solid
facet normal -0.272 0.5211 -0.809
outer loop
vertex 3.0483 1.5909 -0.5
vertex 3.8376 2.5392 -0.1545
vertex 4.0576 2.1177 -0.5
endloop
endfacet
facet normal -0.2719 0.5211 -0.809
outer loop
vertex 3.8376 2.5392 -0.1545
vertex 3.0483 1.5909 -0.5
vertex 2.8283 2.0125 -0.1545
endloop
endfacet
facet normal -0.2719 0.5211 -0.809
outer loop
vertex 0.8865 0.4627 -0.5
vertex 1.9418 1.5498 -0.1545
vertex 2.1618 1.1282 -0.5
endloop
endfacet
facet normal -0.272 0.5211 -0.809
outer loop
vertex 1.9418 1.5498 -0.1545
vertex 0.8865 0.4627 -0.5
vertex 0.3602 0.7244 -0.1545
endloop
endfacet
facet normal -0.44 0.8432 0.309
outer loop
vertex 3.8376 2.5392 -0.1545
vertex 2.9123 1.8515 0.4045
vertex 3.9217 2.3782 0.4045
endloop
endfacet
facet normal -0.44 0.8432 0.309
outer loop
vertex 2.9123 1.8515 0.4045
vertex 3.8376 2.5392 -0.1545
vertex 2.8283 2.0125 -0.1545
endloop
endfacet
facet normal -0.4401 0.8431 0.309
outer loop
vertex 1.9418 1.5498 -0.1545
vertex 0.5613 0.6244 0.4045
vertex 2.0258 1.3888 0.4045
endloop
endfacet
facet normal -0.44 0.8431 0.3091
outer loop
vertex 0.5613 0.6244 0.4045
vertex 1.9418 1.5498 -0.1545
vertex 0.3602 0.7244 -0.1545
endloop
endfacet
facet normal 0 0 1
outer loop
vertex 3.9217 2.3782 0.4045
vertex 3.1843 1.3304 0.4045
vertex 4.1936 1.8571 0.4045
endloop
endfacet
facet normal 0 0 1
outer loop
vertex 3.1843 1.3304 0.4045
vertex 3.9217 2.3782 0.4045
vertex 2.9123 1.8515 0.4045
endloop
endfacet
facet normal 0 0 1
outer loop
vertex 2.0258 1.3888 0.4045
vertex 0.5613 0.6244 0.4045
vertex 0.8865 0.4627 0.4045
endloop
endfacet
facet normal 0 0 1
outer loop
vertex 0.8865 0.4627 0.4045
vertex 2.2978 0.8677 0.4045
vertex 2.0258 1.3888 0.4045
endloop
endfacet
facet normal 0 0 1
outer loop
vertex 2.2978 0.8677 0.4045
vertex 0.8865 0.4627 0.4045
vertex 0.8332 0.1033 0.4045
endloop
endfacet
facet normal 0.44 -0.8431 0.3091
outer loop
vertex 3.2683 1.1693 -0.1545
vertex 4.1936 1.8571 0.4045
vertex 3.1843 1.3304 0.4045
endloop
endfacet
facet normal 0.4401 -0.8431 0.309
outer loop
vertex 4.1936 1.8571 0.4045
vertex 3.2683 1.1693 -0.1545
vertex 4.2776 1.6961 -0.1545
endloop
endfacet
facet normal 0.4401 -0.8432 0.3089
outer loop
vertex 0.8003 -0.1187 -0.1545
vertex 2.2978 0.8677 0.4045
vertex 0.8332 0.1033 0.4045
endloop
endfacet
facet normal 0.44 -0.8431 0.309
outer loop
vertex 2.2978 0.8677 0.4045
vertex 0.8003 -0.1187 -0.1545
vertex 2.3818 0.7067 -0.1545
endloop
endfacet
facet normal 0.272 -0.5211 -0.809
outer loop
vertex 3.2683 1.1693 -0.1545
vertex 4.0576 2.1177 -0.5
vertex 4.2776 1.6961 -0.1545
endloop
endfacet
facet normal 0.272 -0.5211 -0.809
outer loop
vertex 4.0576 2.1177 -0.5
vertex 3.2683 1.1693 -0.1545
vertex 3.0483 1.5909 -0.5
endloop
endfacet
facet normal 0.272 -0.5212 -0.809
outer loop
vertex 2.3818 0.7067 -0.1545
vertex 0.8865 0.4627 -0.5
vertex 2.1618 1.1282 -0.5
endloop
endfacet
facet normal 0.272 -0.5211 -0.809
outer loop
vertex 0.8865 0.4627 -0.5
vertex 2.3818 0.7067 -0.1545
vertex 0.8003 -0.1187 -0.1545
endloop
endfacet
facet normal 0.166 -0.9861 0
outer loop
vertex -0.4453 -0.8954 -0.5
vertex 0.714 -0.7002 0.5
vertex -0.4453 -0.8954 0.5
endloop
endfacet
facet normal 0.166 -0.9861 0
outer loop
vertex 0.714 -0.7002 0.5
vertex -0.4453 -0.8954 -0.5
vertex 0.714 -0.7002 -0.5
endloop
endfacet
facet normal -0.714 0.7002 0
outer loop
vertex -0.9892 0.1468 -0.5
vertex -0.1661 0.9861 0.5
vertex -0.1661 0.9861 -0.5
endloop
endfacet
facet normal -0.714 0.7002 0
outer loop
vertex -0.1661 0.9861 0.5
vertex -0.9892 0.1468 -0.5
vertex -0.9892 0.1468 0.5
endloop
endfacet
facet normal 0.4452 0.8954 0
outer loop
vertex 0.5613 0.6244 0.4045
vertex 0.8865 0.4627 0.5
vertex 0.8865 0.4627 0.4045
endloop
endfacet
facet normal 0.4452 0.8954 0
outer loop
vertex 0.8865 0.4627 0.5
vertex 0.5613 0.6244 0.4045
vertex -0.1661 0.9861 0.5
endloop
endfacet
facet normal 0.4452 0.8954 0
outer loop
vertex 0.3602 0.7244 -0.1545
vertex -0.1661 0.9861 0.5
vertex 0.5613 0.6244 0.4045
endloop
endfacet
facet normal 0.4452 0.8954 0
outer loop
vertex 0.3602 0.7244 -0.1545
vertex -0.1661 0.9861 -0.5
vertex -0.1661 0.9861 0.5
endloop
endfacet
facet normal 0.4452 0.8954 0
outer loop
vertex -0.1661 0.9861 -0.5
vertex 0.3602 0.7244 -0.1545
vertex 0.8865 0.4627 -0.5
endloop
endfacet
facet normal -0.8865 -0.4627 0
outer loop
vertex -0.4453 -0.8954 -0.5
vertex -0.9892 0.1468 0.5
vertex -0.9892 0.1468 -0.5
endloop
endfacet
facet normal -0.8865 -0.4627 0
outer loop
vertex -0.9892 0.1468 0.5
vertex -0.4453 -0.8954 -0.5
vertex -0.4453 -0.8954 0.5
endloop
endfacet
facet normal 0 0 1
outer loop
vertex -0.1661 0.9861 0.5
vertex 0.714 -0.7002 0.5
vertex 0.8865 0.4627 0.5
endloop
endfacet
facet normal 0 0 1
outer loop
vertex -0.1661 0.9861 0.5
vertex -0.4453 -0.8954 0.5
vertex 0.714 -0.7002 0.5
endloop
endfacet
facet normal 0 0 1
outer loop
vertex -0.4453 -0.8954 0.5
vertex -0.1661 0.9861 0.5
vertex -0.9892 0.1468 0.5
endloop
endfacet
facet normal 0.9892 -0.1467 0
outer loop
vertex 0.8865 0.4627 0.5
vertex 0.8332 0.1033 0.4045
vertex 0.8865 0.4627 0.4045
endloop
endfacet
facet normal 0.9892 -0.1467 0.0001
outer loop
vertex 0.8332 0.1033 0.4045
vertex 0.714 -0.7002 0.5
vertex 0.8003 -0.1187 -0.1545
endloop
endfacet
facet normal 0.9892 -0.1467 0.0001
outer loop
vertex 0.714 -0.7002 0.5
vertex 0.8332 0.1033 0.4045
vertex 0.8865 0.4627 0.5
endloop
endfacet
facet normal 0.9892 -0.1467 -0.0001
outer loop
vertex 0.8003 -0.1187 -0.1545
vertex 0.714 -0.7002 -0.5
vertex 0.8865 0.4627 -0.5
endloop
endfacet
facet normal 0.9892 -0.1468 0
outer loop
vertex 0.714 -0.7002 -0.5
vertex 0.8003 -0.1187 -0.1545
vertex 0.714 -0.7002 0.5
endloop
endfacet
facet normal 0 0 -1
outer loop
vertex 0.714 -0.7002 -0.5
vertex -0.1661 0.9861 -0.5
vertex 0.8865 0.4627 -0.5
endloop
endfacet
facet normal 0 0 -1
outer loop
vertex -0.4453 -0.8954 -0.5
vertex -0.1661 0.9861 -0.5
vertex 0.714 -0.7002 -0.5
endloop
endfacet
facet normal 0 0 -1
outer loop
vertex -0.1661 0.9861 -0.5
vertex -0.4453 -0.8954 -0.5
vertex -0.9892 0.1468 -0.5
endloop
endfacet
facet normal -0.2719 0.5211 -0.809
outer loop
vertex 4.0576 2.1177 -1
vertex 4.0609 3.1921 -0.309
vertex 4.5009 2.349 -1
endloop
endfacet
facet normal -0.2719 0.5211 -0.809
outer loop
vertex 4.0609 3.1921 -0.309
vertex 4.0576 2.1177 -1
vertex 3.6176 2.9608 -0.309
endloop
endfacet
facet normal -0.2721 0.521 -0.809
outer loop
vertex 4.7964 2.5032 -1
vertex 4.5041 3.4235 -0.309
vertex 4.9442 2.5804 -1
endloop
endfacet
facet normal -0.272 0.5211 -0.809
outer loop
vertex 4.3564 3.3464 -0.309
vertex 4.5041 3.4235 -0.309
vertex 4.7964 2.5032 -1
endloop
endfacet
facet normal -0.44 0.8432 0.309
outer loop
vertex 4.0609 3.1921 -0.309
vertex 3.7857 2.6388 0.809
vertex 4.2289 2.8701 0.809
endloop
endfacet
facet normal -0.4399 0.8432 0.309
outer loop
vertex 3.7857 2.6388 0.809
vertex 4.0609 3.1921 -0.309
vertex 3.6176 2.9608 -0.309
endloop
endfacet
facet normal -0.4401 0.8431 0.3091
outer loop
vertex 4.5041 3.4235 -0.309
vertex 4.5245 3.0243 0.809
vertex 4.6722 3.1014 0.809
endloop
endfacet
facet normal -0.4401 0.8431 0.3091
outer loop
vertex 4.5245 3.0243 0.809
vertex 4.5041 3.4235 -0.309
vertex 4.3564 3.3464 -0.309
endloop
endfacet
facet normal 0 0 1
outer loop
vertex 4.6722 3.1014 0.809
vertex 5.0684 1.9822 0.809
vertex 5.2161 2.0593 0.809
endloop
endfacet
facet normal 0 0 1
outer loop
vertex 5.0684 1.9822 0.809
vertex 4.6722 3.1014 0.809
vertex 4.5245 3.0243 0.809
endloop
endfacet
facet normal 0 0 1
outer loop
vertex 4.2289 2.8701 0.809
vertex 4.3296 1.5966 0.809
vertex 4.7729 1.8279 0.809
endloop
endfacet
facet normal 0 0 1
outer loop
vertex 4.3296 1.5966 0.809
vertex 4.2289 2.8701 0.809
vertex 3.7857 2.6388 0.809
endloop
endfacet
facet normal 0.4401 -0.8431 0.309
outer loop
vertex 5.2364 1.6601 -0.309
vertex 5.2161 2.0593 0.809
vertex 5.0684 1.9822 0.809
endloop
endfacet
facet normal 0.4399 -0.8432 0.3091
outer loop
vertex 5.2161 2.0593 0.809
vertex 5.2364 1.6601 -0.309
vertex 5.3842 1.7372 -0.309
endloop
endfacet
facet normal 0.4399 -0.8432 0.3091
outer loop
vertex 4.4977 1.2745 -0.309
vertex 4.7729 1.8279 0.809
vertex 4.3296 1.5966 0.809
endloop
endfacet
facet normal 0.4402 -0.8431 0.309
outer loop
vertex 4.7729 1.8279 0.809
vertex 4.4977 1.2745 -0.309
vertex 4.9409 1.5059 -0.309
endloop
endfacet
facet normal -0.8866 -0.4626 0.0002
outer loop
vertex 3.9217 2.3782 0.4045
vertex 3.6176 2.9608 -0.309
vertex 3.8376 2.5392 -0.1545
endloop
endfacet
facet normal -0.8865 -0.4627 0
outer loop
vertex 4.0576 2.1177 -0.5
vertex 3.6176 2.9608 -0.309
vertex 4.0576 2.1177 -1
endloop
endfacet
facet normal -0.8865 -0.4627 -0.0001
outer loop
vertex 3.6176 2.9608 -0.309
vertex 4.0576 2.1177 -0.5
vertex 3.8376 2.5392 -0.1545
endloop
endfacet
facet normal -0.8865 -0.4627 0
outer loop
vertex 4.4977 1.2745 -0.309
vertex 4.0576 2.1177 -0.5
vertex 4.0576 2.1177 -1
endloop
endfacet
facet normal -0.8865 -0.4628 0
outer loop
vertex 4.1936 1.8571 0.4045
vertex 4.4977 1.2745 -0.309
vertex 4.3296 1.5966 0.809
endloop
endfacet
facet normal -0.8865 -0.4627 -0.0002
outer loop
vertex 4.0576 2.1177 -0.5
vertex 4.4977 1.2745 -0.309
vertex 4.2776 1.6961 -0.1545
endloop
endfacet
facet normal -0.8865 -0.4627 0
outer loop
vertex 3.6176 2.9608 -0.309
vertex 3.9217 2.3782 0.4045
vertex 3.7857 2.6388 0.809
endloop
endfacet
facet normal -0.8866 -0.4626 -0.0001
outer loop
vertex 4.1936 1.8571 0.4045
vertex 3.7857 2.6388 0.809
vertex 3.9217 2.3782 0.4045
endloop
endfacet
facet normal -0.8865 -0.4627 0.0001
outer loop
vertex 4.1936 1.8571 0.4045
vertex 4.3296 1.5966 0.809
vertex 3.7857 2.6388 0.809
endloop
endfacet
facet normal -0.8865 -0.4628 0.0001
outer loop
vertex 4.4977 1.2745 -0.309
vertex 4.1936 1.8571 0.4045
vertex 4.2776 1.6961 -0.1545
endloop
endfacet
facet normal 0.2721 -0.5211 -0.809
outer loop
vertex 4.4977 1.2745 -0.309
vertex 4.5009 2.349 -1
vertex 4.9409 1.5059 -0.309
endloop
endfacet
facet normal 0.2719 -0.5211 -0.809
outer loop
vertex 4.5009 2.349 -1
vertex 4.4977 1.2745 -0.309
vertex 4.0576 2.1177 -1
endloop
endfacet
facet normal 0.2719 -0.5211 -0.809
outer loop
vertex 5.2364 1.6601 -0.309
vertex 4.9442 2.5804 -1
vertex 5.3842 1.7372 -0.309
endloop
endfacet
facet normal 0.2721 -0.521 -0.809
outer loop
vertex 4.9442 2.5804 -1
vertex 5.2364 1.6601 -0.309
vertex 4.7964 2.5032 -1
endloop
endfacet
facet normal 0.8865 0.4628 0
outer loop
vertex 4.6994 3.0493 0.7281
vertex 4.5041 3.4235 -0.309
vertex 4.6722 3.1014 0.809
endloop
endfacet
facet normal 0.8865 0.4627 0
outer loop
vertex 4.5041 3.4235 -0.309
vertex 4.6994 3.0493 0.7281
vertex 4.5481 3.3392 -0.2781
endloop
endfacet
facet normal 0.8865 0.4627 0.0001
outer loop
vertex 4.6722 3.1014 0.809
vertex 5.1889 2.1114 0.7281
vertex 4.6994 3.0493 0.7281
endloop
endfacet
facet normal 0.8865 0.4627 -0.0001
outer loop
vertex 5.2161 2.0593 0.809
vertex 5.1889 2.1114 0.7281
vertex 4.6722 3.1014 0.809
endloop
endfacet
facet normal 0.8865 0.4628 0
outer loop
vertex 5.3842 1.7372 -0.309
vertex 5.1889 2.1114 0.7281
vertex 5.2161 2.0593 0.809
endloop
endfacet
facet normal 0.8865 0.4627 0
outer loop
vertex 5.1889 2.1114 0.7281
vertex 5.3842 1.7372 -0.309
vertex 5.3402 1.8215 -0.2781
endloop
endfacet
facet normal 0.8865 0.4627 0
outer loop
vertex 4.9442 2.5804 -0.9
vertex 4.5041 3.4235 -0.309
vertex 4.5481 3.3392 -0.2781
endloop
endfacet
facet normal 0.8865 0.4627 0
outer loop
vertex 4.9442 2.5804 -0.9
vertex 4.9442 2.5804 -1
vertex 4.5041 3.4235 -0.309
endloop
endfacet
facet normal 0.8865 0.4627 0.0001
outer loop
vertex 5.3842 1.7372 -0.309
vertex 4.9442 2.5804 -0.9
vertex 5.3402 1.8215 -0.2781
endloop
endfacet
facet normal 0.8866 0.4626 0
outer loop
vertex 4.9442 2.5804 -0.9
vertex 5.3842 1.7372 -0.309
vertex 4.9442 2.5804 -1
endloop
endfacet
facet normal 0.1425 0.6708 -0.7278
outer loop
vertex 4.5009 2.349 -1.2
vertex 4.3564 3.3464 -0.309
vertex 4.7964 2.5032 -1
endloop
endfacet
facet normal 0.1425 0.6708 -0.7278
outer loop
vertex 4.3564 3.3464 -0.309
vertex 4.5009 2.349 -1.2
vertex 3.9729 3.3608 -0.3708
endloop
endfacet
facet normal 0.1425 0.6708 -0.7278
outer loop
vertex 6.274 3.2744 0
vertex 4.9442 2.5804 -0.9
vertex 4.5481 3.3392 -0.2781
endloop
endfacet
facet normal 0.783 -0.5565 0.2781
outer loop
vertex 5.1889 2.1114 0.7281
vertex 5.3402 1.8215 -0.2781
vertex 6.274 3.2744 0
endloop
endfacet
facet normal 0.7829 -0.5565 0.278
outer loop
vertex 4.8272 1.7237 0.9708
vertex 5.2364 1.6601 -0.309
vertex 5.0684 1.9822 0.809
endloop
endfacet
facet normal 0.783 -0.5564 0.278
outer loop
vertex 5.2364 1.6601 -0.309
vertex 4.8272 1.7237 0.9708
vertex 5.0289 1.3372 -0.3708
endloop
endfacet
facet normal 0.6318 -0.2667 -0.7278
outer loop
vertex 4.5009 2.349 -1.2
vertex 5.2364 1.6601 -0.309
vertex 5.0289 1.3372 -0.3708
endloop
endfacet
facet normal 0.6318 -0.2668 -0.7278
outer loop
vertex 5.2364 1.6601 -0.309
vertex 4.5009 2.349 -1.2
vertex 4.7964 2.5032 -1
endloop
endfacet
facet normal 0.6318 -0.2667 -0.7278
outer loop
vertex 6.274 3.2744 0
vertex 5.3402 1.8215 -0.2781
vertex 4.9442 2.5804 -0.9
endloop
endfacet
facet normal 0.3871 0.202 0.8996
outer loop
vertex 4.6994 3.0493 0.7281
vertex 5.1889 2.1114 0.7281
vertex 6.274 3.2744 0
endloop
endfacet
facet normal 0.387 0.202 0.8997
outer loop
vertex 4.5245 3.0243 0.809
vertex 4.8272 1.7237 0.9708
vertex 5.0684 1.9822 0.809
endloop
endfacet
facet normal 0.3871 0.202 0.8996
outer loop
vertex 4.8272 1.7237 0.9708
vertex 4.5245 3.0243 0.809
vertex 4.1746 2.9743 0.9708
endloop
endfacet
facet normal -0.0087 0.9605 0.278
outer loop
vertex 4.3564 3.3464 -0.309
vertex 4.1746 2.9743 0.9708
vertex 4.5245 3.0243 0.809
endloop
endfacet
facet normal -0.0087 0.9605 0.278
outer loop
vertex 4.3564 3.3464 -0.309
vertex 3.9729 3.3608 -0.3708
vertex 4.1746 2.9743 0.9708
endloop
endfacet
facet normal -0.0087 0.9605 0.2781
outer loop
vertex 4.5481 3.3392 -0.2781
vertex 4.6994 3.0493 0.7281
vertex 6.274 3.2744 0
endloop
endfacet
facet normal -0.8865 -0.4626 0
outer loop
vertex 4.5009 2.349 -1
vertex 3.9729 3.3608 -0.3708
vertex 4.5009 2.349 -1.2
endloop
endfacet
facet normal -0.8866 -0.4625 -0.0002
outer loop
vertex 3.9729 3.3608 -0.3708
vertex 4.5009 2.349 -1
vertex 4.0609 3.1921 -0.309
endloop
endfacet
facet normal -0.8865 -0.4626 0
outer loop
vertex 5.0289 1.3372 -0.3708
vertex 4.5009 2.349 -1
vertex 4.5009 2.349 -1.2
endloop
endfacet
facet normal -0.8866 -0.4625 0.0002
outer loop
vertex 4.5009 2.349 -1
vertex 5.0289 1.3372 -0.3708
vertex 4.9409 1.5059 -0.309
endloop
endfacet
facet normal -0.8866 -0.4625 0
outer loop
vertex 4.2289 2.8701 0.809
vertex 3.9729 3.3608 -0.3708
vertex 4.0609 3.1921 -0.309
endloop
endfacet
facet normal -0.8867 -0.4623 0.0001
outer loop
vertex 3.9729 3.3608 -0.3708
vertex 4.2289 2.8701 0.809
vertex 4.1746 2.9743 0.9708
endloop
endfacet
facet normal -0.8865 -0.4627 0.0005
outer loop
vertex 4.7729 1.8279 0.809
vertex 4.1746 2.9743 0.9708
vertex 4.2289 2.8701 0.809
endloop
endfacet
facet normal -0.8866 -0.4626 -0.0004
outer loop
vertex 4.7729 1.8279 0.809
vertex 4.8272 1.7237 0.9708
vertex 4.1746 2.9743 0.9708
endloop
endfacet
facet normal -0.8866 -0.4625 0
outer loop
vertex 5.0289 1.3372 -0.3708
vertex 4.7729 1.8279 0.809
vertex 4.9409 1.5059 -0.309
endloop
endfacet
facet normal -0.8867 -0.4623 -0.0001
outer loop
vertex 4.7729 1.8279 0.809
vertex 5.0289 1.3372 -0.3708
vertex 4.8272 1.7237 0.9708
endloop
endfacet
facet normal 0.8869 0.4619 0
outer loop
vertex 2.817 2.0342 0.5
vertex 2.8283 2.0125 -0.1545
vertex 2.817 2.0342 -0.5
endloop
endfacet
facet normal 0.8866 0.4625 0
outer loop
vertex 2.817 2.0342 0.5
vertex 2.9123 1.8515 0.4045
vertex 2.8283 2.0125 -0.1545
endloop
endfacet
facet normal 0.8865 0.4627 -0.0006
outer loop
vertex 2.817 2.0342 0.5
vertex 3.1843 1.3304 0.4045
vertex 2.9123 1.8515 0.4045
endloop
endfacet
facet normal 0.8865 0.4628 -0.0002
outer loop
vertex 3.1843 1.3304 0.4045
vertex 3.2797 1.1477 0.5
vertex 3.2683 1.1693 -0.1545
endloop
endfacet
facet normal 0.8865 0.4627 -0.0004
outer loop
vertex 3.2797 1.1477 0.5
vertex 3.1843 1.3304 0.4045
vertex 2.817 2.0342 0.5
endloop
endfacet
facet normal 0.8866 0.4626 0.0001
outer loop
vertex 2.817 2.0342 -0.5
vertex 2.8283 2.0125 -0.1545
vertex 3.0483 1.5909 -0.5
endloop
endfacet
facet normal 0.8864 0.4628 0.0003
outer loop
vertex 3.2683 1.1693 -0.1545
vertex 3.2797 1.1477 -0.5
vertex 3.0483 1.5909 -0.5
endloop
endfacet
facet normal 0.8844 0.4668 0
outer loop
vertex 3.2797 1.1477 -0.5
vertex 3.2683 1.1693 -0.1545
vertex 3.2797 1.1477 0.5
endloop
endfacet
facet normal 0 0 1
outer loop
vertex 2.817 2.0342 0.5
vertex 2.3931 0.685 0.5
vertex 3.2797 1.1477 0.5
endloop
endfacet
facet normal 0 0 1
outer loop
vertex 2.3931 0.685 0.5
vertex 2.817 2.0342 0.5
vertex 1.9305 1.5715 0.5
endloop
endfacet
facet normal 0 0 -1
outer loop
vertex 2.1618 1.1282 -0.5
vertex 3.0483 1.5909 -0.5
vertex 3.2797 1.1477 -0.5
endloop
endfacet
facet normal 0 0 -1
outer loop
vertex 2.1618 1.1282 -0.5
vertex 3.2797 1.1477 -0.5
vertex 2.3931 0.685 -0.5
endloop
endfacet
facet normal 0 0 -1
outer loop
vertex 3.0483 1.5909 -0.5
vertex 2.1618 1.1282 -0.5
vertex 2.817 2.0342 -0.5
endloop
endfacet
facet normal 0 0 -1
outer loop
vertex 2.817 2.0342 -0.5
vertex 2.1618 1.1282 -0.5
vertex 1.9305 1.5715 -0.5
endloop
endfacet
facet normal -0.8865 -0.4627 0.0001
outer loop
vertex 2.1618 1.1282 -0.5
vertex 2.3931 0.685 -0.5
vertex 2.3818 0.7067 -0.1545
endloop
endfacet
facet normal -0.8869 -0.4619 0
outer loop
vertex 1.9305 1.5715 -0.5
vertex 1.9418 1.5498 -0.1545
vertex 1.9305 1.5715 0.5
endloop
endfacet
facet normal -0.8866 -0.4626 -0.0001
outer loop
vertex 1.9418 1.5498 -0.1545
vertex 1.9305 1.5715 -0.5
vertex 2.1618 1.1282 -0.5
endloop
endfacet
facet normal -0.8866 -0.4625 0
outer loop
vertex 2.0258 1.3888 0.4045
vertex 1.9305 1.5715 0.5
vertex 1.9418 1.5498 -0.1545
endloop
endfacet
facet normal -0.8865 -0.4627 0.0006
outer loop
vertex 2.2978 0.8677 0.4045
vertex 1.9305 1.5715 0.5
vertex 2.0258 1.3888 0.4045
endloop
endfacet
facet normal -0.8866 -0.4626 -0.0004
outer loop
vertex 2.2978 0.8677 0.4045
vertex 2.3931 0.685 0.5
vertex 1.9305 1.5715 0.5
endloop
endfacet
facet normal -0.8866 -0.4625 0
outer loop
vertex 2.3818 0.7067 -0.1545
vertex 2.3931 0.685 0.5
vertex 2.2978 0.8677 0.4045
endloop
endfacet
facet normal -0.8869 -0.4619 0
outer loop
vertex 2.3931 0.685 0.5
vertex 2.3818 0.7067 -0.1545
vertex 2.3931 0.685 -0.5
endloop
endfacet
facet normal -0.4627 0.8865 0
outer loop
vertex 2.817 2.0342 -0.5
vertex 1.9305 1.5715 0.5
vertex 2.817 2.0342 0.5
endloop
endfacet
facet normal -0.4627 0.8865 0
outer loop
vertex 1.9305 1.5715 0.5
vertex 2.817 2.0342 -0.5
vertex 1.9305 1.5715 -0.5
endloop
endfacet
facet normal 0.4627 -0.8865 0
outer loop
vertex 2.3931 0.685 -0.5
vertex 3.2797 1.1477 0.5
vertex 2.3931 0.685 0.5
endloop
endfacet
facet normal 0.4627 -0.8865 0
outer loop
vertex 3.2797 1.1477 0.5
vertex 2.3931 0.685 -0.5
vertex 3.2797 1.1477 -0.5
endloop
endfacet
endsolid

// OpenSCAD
// Parameters
axis_end_x = 5.21; //[2.605:10.42:0.01]
axis_end_y = 2.72; //[1.36:5.44:0.01]
axis_end_z = 0; //[-5:5:0.01]
axis_radius = 0.5; //[0.25:1:0.01]
origin_marker_radius = 1; //[0.5:2:0.01]
origin_marker_height = 1; //[0.5:2:0.01]
end_marker_radius = 1; //[0.5:2:0.01]
end_marker_height = 1; //[0.5:2:0.01]
arrowhead_length = 2; //[1:4:0.01]
arrowhead_radius = 1.2; //[0.6:2.4:0.01]
connect_overlap = 0.8; //[0.2:2:0.01]
axis_length = 5.877; //[2.9385:11.754:0.001]
axis_yaw_deg = 27.56; //[-180:180:0.01]
axis_pitch_deg = 0; //[-90:90:0.01]

// Geometry
module axis_vector() {
  translate([axis_length/2, 0, 0])
  rotate([0, 90, 0])
  cylinder(h=axis_length, r=axis_radius, center=true);
}

module origin_marker() {
  translate([0, 0, 0])
  cylinder(h=origin_marker_height, r=origin_marker_radius, center=true);
}

module end_marker() {
  translate([axis_length - connect_overlap, 0, 0])
  rotate([0, 90, 0])
  cylinder(h=end_marker_height, r=end_marker_radius, center=true);
}

module arrowhead() {
  translate([axis_length + arrowhead_length/2 - connect_overlap, 0, 0])
  rotate([0, 90, 0])
  cylinder(h=arrowhead_length, r1=arrowhead_radius, r2=0, center=true);
}

module label_text() {
  translate([axis_length/2, 0, 0])
  cube([axis_radius*2, axis_radius*2, axis_radius*2], center=true);
}

// Assemble the axis
module axis_union_local() {
  union() {
    axis_vector();
    origin_marker();
    end_marker();
    arrowhead();
    label_text();
  }
}

// Final oriented axis
rotate([0, axis_pitch_deg, axis_yaw_deg])
axis_union_local();
